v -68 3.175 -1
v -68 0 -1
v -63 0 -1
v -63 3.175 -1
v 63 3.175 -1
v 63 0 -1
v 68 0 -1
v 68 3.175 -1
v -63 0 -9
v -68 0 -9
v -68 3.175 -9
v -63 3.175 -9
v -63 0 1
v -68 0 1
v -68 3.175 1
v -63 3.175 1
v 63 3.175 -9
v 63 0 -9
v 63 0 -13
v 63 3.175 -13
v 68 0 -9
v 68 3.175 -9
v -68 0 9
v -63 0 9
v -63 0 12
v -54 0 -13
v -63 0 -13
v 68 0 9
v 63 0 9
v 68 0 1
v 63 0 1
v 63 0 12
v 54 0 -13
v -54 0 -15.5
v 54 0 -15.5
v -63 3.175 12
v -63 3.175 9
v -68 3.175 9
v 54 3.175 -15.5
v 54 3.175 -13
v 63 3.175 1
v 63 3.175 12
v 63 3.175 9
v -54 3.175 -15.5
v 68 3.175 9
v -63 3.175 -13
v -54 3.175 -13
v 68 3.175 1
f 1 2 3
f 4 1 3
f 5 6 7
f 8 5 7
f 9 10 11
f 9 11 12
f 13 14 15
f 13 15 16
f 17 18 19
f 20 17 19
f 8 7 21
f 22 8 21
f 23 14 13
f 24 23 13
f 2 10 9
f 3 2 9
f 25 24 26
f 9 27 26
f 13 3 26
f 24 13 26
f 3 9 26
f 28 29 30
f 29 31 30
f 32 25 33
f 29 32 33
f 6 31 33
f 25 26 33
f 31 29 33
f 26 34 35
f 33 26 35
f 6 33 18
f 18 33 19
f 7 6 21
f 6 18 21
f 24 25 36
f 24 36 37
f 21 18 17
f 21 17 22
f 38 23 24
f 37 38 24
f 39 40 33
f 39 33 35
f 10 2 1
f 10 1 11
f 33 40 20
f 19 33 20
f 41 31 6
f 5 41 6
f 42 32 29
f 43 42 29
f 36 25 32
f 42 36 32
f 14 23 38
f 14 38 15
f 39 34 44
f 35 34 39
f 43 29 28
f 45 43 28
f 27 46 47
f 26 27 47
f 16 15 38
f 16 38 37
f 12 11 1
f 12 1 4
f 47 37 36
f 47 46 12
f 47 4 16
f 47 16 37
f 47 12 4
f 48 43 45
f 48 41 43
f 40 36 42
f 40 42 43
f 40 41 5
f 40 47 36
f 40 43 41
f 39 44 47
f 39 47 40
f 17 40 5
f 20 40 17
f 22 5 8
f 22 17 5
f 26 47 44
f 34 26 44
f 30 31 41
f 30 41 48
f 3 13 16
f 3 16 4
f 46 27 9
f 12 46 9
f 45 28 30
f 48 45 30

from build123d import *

# Parameters (mm, degrees)
SKETCH1_W               = 5
SKETCH1_H               = 18
SKETCH1_W_2             = 126
SKETCH1_H_2             = 24
SKETCH1_H_3             = 3.5
BOSS_EXTRUDE1_DEPTH     = 3.175
SKETCH2_W               = 9
SKETCH2_H               = 2.5
CUT_EXTRUDE1_DEPTH      = 70.81640656
CUT_EXTRUDE2_DEPTH      = 70.81640656
CUT_EXTRUDE2_DEPTH_BACK = 70.81640656
SKETCH5_W               = 5
SKETCH5_H               = 2


with BuildPart() as part:
    # Sketch1 → Boss-Extrude1 (new body)
    with BuildSketch(Plane(origin=(0, 0, 0), x_dir=(1, 0, 0), z_dir=(0, 1, 0))):
        with Locations((-65.5, 0)):
            Rectangle(SKETCH1_W, SKETCH1_H)
        Rectangle(SKETCH1_W_2, SKETCH1_H_2)
        with Locations((65.5, 0)):
            Rectangle(SKETCH1_W, SKETCH1_H)
        with Locations((0, 13.75)):
            Rectangle(SKETCH1_W_2, SKETCH1_H_3)
    extrude(amount=BOSS_EXTRUDE1_DEPTH)

    # Sketch2 → Cut-Extrude1 (cut, through all)
    with BuildSketch(Plane(origin=(0, 3.175, 0), x_dir=(1, 0, 0), z_dir=(0, 1, 0))):
        with Locations((-58.5, 14.25)):
            Rectangle(SKETCH2_W, SKETCH2_H)
        with Locations((58.5, 14.25)):
            Rectangle(SKETCH2_W, SKETCH2_H)
    extrude(amount=-CUT_EXTRUDE1_DEPTH, mode=Mode.SUBTRACT)

    # Sketch5 → Cut-Extrude2 (cut, two sides: drawn at the far end of the back side and taken through both)
    with BuildSketch(Plane(origin=(0, 3.175, 0), x_dir=(1, 0, 0), z_dir=(0, 1, 0)).offset(-CUT_EXTRUDE2_DEPTH_BACK)):
        with Locations((-65.5, 0)):
            Rectangle(SKETCH5_W, SKETCH5_H)
        with Locations((65.5, 0)):
            Rectangle(SKETCH5_W, SKETCH5_H)
    extrude(amount=CUT_EXTRUDE2_DEPTH + CUT_EXTRUDE2_DEPTH_BACK, mode=Mode.SUBTRACT)


solid = part.part
